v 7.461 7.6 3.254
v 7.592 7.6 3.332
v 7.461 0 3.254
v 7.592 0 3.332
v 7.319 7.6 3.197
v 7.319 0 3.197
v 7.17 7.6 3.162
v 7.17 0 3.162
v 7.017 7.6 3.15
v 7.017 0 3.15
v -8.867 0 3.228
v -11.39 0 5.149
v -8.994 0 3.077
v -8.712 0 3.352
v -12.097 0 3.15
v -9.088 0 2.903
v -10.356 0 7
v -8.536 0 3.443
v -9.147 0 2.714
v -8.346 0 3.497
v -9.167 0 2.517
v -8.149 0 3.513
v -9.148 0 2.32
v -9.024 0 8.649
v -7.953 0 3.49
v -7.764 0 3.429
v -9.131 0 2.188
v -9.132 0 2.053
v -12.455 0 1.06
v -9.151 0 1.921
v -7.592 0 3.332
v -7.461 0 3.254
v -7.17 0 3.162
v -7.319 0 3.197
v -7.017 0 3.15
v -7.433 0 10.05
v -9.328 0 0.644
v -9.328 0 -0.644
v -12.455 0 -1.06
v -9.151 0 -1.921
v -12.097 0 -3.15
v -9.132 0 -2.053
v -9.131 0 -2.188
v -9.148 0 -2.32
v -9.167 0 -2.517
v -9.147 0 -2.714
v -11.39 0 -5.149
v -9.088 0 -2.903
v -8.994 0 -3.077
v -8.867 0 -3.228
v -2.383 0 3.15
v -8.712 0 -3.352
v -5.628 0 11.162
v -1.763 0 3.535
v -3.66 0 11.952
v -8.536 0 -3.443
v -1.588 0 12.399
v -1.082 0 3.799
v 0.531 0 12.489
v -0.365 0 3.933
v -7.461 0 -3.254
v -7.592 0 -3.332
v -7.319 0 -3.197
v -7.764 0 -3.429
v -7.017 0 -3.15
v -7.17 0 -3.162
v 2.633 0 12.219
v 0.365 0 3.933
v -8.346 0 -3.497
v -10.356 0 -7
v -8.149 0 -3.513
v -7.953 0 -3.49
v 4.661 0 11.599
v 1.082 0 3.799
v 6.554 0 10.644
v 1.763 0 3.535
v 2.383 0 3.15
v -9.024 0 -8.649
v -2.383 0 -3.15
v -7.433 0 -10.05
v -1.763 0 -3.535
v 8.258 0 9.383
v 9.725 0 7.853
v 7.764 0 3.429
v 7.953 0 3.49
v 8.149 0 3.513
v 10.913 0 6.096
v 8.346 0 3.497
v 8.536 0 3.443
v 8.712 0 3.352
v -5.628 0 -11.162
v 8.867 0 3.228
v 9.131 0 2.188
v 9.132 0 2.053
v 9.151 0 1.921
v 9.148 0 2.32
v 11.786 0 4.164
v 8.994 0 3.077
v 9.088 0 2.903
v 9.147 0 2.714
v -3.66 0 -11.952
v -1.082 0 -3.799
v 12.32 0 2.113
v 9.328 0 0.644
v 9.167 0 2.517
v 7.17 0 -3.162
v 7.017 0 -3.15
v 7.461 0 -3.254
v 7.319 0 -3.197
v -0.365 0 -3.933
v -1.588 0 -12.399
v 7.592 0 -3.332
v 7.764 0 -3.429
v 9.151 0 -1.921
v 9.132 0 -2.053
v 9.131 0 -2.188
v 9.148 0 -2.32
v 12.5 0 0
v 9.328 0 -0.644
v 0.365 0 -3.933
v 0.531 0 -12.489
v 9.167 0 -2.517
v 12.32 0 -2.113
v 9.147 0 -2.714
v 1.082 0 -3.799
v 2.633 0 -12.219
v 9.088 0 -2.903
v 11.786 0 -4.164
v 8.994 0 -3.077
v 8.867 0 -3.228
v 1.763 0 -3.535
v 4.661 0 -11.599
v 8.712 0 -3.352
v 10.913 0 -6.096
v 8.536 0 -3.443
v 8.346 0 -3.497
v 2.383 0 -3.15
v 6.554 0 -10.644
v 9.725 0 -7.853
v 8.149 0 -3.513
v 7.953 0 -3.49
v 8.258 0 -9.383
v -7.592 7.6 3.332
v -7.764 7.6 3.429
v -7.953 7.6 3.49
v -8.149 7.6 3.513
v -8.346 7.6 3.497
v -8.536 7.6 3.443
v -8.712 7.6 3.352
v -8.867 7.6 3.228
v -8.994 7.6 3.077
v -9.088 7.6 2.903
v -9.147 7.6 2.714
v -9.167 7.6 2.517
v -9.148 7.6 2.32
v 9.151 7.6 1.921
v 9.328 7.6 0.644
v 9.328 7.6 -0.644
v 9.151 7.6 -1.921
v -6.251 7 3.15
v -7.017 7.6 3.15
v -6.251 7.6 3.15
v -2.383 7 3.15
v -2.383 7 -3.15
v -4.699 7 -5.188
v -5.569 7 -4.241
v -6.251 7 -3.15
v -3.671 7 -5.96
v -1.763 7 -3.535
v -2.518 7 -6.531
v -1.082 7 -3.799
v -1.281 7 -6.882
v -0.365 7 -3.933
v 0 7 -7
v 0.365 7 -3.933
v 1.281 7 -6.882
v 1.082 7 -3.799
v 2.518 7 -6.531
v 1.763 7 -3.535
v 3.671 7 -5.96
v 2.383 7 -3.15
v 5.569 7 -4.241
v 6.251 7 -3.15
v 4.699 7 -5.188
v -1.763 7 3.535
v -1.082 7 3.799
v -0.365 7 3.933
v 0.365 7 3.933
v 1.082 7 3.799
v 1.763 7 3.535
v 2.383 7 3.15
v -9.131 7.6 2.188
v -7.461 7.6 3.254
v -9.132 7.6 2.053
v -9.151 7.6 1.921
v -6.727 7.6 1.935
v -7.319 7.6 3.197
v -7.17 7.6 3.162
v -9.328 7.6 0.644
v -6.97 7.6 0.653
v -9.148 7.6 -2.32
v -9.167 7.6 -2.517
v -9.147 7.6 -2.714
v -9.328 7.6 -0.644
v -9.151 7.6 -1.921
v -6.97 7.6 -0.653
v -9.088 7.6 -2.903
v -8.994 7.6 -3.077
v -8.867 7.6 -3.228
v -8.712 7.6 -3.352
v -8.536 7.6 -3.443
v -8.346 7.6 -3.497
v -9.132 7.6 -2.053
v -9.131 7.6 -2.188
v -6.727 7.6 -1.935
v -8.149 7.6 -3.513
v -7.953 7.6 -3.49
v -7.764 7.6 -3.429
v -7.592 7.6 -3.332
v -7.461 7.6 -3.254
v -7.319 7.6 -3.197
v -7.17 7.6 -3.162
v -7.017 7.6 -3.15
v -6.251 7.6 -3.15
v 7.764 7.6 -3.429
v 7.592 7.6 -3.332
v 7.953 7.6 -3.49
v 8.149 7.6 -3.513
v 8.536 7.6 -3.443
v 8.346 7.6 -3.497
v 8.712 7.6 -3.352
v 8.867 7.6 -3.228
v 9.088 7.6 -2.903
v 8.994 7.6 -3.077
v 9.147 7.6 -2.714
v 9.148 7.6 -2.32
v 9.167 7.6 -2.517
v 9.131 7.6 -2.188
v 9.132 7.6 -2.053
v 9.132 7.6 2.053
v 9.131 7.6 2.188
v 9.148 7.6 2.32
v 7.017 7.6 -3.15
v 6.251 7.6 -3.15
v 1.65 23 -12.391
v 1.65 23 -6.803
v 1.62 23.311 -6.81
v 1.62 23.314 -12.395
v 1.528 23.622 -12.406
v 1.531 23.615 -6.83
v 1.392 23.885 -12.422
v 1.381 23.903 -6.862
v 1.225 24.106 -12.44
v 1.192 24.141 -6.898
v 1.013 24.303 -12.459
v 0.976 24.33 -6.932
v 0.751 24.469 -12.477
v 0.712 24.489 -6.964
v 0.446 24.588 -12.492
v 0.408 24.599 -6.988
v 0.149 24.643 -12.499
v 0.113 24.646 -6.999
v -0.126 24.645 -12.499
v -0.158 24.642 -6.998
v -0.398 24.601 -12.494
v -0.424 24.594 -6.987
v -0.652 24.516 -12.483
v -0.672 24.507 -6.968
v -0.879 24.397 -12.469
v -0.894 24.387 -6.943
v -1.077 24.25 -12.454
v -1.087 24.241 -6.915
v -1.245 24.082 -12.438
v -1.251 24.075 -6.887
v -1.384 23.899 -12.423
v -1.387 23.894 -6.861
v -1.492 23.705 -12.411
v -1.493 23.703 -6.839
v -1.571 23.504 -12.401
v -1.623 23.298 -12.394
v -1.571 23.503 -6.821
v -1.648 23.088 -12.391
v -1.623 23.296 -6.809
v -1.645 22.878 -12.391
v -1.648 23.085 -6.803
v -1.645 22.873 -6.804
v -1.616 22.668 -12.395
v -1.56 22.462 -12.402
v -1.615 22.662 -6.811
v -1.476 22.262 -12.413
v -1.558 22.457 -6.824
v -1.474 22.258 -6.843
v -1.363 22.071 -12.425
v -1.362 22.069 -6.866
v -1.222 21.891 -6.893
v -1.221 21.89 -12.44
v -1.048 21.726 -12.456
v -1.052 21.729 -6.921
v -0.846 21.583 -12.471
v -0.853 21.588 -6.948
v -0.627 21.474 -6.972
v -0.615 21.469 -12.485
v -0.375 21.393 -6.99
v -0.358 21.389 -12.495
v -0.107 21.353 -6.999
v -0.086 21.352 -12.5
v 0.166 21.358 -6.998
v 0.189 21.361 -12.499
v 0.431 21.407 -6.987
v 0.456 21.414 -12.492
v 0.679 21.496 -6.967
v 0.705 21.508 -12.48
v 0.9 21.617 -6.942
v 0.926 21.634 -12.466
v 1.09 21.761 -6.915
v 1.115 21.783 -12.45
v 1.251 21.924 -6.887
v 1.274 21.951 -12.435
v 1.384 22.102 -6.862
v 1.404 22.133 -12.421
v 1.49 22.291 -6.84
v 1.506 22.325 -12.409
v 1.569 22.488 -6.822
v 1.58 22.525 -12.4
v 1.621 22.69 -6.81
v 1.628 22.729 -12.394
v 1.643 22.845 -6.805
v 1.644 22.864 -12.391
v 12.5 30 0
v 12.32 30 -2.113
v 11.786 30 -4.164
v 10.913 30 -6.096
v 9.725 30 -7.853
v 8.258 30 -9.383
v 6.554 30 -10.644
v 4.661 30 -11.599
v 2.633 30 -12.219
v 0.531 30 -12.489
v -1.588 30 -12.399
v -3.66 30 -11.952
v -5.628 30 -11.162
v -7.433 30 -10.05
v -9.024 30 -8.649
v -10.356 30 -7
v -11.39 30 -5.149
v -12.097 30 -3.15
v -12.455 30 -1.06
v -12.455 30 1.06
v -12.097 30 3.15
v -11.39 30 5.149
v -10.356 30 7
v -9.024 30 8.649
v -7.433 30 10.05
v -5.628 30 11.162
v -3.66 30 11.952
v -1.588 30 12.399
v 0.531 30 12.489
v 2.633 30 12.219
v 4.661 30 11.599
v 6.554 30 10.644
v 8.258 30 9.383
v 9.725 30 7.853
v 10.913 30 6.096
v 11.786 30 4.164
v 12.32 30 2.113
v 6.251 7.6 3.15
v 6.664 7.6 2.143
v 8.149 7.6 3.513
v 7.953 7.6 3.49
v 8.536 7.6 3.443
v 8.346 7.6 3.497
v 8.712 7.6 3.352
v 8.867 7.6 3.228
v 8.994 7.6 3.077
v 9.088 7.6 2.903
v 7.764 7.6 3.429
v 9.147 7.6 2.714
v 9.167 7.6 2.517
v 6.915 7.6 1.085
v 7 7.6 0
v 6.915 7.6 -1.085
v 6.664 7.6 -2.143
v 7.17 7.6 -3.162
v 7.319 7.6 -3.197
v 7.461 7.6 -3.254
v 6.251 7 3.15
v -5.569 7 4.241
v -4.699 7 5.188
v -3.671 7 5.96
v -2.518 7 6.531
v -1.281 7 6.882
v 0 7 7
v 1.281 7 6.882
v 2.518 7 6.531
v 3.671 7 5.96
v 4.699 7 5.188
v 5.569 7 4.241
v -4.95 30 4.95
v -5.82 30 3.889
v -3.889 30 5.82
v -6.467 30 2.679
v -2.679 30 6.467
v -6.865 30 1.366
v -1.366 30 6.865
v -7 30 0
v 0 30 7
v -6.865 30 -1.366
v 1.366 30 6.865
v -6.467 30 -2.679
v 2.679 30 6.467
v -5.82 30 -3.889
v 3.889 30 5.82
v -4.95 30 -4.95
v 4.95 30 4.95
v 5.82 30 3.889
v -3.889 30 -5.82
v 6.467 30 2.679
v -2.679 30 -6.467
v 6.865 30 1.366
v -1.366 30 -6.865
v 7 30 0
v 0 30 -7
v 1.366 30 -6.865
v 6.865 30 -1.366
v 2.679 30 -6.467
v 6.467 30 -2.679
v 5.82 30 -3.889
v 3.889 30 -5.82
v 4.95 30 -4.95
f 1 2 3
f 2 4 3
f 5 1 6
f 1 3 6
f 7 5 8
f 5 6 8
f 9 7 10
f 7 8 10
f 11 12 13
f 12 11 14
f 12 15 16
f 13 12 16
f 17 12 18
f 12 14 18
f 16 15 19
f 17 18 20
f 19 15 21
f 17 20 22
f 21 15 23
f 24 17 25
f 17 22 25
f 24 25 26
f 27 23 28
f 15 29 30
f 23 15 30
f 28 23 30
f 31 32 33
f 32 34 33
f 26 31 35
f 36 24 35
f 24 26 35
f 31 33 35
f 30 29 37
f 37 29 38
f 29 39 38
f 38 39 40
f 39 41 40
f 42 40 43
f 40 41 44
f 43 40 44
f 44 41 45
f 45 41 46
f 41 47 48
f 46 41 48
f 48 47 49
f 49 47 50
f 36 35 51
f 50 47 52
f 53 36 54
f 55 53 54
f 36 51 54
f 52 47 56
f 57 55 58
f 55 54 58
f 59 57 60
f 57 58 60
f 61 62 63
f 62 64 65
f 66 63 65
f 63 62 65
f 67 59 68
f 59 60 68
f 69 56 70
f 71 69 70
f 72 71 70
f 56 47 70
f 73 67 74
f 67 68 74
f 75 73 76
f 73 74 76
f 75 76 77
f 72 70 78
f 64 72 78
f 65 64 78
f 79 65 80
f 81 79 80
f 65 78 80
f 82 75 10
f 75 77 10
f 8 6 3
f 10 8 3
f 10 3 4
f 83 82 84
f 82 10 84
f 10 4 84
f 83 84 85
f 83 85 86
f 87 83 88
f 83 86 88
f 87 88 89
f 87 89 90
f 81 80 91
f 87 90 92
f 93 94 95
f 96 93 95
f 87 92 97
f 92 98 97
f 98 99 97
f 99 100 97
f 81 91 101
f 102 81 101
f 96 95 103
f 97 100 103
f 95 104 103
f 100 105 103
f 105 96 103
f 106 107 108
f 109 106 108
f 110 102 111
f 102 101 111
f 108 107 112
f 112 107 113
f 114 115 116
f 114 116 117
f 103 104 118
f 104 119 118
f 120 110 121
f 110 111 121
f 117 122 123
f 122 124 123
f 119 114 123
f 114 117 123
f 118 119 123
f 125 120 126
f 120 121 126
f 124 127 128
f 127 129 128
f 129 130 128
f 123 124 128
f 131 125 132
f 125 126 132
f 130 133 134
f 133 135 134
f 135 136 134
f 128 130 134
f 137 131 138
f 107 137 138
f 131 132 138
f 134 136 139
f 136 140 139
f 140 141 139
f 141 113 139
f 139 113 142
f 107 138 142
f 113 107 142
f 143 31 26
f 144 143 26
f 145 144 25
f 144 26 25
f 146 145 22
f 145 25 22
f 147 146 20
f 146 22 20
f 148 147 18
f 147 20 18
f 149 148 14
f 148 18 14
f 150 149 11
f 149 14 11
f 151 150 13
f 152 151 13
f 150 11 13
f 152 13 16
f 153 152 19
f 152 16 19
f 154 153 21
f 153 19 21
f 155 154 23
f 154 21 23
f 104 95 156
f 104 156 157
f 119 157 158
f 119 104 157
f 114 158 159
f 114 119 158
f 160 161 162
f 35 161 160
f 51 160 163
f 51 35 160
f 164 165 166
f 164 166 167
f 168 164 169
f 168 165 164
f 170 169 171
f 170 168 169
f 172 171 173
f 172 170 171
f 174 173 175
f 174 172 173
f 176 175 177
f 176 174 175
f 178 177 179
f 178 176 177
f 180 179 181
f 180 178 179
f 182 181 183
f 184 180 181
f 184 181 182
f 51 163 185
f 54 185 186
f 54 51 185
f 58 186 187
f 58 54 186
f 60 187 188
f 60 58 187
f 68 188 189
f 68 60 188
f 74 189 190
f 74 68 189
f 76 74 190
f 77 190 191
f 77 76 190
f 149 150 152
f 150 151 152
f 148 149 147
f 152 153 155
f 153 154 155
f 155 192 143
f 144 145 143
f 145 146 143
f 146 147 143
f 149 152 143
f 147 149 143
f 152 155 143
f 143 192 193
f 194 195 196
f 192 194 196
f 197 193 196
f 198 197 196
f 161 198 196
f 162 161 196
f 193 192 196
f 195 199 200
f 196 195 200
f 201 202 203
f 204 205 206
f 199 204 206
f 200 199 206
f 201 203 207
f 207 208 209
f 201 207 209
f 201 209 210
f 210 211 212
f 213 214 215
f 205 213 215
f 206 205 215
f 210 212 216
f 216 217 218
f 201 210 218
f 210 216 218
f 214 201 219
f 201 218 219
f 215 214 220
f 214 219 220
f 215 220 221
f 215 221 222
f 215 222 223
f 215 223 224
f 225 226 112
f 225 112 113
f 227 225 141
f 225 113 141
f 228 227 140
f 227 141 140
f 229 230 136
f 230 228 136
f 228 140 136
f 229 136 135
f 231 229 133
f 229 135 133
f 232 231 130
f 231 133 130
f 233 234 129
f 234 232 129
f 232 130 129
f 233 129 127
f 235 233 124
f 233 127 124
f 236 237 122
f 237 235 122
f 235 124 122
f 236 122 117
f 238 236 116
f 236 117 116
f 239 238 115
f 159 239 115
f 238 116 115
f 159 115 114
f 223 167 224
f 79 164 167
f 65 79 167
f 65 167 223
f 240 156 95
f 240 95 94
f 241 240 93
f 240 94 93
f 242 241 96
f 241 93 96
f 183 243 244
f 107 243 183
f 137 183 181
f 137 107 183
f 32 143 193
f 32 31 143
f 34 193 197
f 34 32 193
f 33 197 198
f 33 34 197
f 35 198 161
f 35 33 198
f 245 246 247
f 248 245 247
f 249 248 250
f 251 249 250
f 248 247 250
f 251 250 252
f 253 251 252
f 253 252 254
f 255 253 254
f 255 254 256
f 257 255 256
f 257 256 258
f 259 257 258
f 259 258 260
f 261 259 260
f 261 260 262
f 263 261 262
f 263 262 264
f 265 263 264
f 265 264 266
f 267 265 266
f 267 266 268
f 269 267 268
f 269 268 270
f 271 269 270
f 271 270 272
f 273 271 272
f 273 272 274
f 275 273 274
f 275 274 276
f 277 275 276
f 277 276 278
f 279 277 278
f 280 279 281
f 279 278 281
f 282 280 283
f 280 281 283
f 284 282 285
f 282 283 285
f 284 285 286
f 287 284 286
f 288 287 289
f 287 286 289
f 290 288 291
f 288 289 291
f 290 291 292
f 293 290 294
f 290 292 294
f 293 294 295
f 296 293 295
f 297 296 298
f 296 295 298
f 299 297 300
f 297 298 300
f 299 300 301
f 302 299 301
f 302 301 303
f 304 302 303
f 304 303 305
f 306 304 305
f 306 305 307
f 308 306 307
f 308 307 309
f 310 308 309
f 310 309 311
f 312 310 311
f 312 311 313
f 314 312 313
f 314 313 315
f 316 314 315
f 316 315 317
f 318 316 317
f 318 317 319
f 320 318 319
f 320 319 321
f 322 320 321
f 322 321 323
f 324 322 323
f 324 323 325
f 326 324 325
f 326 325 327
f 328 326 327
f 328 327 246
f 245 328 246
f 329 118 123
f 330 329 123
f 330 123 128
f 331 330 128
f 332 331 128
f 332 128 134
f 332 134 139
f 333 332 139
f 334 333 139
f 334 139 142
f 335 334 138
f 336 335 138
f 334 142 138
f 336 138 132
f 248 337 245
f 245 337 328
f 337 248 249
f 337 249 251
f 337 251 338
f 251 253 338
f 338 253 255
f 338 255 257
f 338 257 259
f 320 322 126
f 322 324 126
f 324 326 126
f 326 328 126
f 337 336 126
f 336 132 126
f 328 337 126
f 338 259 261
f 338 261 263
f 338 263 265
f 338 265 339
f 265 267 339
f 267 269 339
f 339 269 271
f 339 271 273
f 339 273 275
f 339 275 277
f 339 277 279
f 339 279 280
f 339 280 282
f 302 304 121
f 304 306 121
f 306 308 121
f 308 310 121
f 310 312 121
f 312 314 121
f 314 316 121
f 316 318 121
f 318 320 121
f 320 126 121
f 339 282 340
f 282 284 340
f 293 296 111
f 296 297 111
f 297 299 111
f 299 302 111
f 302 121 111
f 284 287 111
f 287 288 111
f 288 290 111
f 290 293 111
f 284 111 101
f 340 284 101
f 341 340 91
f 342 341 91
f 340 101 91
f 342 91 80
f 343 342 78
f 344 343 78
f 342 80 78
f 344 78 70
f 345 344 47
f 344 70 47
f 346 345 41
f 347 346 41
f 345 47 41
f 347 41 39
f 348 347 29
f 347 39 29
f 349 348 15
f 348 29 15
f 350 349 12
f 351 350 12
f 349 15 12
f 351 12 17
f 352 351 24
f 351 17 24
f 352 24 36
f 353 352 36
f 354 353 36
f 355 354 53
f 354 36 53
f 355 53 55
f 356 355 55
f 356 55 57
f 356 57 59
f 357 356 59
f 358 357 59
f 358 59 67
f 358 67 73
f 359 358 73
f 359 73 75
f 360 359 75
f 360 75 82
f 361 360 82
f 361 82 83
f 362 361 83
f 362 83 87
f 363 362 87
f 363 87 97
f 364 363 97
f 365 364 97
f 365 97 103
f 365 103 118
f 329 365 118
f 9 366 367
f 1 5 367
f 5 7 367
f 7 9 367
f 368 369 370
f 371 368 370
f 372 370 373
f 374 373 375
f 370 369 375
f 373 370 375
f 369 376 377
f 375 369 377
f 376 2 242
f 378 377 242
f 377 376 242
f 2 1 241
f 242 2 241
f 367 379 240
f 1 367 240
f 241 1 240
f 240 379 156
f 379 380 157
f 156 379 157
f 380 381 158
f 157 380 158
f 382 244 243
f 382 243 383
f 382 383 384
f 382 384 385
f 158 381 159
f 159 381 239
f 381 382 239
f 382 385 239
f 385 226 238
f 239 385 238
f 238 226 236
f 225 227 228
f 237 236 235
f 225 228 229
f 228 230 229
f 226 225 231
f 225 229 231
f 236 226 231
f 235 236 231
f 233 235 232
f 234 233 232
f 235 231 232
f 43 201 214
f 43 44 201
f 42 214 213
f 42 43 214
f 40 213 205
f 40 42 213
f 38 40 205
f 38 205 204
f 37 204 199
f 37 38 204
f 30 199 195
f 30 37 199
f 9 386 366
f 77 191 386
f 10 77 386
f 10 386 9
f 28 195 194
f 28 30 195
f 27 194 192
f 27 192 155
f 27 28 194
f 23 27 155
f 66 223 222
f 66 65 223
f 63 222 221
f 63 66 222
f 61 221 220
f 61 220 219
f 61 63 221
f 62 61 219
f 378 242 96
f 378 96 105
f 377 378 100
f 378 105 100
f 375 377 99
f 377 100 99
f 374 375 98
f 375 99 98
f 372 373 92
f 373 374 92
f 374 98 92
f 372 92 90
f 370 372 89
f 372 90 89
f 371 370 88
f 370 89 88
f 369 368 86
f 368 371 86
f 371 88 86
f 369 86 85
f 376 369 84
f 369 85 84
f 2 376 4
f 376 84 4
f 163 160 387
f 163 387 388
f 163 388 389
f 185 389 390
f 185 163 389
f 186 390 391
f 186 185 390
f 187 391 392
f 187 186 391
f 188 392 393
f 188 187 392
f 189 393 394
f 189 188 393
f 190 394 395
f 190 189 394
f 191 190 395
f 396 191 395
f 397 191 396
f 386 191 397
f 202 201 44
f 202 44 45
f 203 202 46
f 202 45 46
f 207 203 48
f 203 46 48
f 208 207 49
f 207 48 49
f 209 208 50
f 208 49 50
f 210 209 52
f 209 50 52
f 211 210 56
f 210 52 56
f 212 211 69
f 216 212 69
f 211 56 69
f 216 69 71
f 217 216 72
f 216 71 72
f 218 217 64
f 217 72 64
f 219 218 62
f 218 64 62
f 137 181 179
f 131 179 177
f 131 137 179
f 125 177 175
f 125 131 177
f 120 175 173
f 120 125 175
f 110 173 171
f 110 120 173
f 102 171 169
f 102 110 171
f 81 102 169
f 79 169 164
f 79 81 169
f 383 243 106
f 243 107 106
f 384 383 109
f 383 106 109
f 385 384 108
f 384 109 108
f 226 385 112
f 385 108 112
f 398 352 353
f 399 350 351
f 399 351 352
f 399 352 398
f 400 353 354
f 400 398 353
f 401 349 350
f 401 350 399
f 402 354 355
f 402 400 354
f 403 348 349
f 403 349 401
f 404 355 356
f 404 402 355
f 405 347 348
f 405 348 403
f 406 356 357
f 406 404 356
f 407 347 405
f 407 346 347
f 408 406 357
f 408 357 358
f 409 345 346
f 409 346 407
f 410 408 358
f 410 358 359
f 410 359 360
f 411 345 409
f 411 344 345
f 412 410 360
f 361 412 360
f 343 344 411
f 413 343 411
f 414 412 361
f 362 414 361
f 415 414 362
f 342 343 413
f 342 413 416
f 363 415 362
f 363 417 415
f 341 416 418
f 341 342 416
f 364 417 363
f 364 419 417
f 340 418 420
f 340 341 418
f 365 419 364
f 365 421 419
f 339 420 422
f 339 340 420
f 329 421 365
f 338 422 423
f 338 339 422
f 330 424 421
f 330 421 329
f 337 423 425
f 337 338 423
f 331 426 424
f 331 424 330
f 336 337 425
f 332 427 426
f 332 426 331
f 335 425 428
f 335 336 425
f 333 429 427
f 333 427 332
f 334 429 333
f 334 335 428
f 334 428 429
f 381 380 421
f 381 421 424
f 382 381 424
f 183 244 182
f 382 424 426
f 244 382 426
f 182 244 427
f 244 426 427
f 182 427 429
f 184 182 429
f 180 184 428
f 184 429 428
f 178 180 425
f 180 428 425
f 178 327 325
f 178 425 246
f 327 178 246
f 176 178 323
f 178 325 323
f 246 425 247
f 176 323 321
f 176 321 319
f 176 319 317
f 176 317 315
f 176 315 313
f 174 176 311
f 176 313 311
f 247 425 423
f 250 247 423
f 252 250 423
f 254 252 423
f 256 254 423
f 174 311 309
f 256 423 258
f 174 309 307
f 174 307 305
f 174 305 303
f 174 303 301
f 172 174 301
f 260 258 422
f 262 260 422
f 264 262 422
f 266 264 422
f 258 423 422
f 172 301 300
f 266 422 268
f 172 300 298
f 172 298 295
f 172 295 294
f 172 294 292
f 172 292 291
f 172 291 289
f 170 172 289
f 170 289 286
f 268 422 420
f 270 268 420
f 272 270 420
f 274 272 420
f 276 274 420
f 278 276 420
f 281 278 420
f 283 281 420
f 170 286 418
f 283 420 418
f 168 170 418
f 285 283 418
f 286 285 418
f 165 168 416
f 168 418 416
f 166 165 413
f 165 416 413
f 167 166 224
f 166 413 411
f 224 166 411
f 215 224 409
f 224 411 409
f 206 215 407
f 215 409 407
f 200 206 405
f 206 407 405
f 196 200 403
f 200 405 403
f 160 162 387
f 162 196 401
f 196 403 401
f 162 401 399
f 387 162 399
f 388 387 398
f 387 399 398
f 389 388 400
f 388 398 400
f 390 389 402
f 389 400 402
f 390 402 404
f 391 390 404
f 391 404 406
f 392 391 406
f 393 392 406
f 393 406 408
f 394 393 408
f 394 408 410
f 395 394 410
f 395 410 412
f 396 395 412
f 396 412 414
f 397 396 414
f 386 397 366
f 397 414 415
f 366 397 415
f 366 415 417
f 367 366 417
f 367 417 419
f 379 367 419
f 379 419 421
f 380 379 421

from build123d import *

# Parameters (mm, degrees)
SKETCH1_R           = 12.5
BOSS_EXTRUDE1_DEPTH = 30
SKETCH2_R           = 7
CUT_EXTRUDE1_DEPTH  = 23
CUT_EXTRUDE3_DEPTH  = 7.6
SKETCH6_R           = 1
CUT_EXTRUDE4_DEPTH  = 7.6
FILLET2_R           = 1
SKETCH7_R           = 1.65
CUT_EXTRUDE5_DEPTH  = 19.5


with BuildPart() as part:
    # Sketch1 → Boss-Extrude1 (new body)
    with BuildSketch(Plane(origin=(0, 0, 0), x_dir=(1, 0, 0), z_dir=(0, 1, 0))):
        Circle(SKETCH1_R)
    extrude(amount=BOSS_EXTRUDE1_DEPTH)

    # Sketch2 → Cut-Extrude1 (cut)
    with BuildSketch(Plane(origin=(0, 30, 0), x_dir=(1, 0, 0), z_dir=(0, 1, 0))):
        Circle(SKETCH2_R)
    extrude(amount=-CUT_EXTRUDE1_DEPTH, mode=Mode.SUBTRACT)

    # Sketch5 → Cut-Extrude3 (cut)
    with BuildSketch(Plane(origin=(0, 0, 0), x_dir=(-1, 0, 0), z_dir=(0, -1, 0))):
        with BuildLine():
            Line((2.383275058, 3.15), (8.803408431, 3.15))
            ThreePointArc((8.803408431, 3.15), (9.35, 0), (8.803408431, -3.15))
            Line((8.803408431, -3.15), (2.383275058, -3.15))
            ThreePointArc((2.383275058, -3.15), (0, -3.95), (-2.383275058, -3.15))
            Line((-2.383275058, -3.15), (-8.803408431, -3.15))
            ThreePointArc((-8.803408431, -3.15), (-9.35, 0), (-8.803408431, 3.15))
            Line((-8.803408431, 3.15), (-2.383275058, 3.15))
            ThreePointArc((-2.383275058, 3.15), (0, 3.95), (2.383275058, 3.15))
        make_face()
    extrude(amount=-CUT_EXTRUDE3_DEPTH, mode=Mode.SUBTRACT)

    # Sketch6 → Cut-Extrude4 (cut)
    with BuildSketch(Plane.XZ):
        with Locations((-8.167012328, 2.513603897)):
            Circle(SKETCH6_R)
        with Locations((8.167012328, 2.513603897)):
            Circle(SKETCH6_R)
        with Locations((8.167012328, -2.513603897)):
            Circle(SKETCH6_R)
        with Locations((-8.167012328, -2.513603897)):
            Circle(SKETCH6_R)
    extrude(amount=-CUT_EXTRUDE4_DEPTH, mode=Mode.SUBTRACT)

    # Fillet2
    fillet2_edges = [part.edges().sort_by_distance(p)[0] for p in [
        (-9.099116447, 3.8, 2.151413462),
        (-7.395649897, 3.8, 3.15),
        (9.099116447, 3.8, -2.151413462),
        (9.099116447, 3.8, 2.151413462),
        (-9.099116447, 3.8, -2.151413462),
        (7.395649897, 3.8, 3.15),
        (7.395649897, 3.8, -3.15),
        (-7.395649897, 3.8, -3.15),
    ]]
    fillet(fillet2_edges, radius=FILLET2_R)

    # Sketch7 → Cut-Extrude5 (cut)
    with BuildSketch(Plane.XY):
        with Locations((0, 23)):
            Circle(SKETCH7_R)
    extrude(amount=-CUT_EXTRUDE5_DEPTH, mode=Mode.SUBTRACT)


solid = part.part
